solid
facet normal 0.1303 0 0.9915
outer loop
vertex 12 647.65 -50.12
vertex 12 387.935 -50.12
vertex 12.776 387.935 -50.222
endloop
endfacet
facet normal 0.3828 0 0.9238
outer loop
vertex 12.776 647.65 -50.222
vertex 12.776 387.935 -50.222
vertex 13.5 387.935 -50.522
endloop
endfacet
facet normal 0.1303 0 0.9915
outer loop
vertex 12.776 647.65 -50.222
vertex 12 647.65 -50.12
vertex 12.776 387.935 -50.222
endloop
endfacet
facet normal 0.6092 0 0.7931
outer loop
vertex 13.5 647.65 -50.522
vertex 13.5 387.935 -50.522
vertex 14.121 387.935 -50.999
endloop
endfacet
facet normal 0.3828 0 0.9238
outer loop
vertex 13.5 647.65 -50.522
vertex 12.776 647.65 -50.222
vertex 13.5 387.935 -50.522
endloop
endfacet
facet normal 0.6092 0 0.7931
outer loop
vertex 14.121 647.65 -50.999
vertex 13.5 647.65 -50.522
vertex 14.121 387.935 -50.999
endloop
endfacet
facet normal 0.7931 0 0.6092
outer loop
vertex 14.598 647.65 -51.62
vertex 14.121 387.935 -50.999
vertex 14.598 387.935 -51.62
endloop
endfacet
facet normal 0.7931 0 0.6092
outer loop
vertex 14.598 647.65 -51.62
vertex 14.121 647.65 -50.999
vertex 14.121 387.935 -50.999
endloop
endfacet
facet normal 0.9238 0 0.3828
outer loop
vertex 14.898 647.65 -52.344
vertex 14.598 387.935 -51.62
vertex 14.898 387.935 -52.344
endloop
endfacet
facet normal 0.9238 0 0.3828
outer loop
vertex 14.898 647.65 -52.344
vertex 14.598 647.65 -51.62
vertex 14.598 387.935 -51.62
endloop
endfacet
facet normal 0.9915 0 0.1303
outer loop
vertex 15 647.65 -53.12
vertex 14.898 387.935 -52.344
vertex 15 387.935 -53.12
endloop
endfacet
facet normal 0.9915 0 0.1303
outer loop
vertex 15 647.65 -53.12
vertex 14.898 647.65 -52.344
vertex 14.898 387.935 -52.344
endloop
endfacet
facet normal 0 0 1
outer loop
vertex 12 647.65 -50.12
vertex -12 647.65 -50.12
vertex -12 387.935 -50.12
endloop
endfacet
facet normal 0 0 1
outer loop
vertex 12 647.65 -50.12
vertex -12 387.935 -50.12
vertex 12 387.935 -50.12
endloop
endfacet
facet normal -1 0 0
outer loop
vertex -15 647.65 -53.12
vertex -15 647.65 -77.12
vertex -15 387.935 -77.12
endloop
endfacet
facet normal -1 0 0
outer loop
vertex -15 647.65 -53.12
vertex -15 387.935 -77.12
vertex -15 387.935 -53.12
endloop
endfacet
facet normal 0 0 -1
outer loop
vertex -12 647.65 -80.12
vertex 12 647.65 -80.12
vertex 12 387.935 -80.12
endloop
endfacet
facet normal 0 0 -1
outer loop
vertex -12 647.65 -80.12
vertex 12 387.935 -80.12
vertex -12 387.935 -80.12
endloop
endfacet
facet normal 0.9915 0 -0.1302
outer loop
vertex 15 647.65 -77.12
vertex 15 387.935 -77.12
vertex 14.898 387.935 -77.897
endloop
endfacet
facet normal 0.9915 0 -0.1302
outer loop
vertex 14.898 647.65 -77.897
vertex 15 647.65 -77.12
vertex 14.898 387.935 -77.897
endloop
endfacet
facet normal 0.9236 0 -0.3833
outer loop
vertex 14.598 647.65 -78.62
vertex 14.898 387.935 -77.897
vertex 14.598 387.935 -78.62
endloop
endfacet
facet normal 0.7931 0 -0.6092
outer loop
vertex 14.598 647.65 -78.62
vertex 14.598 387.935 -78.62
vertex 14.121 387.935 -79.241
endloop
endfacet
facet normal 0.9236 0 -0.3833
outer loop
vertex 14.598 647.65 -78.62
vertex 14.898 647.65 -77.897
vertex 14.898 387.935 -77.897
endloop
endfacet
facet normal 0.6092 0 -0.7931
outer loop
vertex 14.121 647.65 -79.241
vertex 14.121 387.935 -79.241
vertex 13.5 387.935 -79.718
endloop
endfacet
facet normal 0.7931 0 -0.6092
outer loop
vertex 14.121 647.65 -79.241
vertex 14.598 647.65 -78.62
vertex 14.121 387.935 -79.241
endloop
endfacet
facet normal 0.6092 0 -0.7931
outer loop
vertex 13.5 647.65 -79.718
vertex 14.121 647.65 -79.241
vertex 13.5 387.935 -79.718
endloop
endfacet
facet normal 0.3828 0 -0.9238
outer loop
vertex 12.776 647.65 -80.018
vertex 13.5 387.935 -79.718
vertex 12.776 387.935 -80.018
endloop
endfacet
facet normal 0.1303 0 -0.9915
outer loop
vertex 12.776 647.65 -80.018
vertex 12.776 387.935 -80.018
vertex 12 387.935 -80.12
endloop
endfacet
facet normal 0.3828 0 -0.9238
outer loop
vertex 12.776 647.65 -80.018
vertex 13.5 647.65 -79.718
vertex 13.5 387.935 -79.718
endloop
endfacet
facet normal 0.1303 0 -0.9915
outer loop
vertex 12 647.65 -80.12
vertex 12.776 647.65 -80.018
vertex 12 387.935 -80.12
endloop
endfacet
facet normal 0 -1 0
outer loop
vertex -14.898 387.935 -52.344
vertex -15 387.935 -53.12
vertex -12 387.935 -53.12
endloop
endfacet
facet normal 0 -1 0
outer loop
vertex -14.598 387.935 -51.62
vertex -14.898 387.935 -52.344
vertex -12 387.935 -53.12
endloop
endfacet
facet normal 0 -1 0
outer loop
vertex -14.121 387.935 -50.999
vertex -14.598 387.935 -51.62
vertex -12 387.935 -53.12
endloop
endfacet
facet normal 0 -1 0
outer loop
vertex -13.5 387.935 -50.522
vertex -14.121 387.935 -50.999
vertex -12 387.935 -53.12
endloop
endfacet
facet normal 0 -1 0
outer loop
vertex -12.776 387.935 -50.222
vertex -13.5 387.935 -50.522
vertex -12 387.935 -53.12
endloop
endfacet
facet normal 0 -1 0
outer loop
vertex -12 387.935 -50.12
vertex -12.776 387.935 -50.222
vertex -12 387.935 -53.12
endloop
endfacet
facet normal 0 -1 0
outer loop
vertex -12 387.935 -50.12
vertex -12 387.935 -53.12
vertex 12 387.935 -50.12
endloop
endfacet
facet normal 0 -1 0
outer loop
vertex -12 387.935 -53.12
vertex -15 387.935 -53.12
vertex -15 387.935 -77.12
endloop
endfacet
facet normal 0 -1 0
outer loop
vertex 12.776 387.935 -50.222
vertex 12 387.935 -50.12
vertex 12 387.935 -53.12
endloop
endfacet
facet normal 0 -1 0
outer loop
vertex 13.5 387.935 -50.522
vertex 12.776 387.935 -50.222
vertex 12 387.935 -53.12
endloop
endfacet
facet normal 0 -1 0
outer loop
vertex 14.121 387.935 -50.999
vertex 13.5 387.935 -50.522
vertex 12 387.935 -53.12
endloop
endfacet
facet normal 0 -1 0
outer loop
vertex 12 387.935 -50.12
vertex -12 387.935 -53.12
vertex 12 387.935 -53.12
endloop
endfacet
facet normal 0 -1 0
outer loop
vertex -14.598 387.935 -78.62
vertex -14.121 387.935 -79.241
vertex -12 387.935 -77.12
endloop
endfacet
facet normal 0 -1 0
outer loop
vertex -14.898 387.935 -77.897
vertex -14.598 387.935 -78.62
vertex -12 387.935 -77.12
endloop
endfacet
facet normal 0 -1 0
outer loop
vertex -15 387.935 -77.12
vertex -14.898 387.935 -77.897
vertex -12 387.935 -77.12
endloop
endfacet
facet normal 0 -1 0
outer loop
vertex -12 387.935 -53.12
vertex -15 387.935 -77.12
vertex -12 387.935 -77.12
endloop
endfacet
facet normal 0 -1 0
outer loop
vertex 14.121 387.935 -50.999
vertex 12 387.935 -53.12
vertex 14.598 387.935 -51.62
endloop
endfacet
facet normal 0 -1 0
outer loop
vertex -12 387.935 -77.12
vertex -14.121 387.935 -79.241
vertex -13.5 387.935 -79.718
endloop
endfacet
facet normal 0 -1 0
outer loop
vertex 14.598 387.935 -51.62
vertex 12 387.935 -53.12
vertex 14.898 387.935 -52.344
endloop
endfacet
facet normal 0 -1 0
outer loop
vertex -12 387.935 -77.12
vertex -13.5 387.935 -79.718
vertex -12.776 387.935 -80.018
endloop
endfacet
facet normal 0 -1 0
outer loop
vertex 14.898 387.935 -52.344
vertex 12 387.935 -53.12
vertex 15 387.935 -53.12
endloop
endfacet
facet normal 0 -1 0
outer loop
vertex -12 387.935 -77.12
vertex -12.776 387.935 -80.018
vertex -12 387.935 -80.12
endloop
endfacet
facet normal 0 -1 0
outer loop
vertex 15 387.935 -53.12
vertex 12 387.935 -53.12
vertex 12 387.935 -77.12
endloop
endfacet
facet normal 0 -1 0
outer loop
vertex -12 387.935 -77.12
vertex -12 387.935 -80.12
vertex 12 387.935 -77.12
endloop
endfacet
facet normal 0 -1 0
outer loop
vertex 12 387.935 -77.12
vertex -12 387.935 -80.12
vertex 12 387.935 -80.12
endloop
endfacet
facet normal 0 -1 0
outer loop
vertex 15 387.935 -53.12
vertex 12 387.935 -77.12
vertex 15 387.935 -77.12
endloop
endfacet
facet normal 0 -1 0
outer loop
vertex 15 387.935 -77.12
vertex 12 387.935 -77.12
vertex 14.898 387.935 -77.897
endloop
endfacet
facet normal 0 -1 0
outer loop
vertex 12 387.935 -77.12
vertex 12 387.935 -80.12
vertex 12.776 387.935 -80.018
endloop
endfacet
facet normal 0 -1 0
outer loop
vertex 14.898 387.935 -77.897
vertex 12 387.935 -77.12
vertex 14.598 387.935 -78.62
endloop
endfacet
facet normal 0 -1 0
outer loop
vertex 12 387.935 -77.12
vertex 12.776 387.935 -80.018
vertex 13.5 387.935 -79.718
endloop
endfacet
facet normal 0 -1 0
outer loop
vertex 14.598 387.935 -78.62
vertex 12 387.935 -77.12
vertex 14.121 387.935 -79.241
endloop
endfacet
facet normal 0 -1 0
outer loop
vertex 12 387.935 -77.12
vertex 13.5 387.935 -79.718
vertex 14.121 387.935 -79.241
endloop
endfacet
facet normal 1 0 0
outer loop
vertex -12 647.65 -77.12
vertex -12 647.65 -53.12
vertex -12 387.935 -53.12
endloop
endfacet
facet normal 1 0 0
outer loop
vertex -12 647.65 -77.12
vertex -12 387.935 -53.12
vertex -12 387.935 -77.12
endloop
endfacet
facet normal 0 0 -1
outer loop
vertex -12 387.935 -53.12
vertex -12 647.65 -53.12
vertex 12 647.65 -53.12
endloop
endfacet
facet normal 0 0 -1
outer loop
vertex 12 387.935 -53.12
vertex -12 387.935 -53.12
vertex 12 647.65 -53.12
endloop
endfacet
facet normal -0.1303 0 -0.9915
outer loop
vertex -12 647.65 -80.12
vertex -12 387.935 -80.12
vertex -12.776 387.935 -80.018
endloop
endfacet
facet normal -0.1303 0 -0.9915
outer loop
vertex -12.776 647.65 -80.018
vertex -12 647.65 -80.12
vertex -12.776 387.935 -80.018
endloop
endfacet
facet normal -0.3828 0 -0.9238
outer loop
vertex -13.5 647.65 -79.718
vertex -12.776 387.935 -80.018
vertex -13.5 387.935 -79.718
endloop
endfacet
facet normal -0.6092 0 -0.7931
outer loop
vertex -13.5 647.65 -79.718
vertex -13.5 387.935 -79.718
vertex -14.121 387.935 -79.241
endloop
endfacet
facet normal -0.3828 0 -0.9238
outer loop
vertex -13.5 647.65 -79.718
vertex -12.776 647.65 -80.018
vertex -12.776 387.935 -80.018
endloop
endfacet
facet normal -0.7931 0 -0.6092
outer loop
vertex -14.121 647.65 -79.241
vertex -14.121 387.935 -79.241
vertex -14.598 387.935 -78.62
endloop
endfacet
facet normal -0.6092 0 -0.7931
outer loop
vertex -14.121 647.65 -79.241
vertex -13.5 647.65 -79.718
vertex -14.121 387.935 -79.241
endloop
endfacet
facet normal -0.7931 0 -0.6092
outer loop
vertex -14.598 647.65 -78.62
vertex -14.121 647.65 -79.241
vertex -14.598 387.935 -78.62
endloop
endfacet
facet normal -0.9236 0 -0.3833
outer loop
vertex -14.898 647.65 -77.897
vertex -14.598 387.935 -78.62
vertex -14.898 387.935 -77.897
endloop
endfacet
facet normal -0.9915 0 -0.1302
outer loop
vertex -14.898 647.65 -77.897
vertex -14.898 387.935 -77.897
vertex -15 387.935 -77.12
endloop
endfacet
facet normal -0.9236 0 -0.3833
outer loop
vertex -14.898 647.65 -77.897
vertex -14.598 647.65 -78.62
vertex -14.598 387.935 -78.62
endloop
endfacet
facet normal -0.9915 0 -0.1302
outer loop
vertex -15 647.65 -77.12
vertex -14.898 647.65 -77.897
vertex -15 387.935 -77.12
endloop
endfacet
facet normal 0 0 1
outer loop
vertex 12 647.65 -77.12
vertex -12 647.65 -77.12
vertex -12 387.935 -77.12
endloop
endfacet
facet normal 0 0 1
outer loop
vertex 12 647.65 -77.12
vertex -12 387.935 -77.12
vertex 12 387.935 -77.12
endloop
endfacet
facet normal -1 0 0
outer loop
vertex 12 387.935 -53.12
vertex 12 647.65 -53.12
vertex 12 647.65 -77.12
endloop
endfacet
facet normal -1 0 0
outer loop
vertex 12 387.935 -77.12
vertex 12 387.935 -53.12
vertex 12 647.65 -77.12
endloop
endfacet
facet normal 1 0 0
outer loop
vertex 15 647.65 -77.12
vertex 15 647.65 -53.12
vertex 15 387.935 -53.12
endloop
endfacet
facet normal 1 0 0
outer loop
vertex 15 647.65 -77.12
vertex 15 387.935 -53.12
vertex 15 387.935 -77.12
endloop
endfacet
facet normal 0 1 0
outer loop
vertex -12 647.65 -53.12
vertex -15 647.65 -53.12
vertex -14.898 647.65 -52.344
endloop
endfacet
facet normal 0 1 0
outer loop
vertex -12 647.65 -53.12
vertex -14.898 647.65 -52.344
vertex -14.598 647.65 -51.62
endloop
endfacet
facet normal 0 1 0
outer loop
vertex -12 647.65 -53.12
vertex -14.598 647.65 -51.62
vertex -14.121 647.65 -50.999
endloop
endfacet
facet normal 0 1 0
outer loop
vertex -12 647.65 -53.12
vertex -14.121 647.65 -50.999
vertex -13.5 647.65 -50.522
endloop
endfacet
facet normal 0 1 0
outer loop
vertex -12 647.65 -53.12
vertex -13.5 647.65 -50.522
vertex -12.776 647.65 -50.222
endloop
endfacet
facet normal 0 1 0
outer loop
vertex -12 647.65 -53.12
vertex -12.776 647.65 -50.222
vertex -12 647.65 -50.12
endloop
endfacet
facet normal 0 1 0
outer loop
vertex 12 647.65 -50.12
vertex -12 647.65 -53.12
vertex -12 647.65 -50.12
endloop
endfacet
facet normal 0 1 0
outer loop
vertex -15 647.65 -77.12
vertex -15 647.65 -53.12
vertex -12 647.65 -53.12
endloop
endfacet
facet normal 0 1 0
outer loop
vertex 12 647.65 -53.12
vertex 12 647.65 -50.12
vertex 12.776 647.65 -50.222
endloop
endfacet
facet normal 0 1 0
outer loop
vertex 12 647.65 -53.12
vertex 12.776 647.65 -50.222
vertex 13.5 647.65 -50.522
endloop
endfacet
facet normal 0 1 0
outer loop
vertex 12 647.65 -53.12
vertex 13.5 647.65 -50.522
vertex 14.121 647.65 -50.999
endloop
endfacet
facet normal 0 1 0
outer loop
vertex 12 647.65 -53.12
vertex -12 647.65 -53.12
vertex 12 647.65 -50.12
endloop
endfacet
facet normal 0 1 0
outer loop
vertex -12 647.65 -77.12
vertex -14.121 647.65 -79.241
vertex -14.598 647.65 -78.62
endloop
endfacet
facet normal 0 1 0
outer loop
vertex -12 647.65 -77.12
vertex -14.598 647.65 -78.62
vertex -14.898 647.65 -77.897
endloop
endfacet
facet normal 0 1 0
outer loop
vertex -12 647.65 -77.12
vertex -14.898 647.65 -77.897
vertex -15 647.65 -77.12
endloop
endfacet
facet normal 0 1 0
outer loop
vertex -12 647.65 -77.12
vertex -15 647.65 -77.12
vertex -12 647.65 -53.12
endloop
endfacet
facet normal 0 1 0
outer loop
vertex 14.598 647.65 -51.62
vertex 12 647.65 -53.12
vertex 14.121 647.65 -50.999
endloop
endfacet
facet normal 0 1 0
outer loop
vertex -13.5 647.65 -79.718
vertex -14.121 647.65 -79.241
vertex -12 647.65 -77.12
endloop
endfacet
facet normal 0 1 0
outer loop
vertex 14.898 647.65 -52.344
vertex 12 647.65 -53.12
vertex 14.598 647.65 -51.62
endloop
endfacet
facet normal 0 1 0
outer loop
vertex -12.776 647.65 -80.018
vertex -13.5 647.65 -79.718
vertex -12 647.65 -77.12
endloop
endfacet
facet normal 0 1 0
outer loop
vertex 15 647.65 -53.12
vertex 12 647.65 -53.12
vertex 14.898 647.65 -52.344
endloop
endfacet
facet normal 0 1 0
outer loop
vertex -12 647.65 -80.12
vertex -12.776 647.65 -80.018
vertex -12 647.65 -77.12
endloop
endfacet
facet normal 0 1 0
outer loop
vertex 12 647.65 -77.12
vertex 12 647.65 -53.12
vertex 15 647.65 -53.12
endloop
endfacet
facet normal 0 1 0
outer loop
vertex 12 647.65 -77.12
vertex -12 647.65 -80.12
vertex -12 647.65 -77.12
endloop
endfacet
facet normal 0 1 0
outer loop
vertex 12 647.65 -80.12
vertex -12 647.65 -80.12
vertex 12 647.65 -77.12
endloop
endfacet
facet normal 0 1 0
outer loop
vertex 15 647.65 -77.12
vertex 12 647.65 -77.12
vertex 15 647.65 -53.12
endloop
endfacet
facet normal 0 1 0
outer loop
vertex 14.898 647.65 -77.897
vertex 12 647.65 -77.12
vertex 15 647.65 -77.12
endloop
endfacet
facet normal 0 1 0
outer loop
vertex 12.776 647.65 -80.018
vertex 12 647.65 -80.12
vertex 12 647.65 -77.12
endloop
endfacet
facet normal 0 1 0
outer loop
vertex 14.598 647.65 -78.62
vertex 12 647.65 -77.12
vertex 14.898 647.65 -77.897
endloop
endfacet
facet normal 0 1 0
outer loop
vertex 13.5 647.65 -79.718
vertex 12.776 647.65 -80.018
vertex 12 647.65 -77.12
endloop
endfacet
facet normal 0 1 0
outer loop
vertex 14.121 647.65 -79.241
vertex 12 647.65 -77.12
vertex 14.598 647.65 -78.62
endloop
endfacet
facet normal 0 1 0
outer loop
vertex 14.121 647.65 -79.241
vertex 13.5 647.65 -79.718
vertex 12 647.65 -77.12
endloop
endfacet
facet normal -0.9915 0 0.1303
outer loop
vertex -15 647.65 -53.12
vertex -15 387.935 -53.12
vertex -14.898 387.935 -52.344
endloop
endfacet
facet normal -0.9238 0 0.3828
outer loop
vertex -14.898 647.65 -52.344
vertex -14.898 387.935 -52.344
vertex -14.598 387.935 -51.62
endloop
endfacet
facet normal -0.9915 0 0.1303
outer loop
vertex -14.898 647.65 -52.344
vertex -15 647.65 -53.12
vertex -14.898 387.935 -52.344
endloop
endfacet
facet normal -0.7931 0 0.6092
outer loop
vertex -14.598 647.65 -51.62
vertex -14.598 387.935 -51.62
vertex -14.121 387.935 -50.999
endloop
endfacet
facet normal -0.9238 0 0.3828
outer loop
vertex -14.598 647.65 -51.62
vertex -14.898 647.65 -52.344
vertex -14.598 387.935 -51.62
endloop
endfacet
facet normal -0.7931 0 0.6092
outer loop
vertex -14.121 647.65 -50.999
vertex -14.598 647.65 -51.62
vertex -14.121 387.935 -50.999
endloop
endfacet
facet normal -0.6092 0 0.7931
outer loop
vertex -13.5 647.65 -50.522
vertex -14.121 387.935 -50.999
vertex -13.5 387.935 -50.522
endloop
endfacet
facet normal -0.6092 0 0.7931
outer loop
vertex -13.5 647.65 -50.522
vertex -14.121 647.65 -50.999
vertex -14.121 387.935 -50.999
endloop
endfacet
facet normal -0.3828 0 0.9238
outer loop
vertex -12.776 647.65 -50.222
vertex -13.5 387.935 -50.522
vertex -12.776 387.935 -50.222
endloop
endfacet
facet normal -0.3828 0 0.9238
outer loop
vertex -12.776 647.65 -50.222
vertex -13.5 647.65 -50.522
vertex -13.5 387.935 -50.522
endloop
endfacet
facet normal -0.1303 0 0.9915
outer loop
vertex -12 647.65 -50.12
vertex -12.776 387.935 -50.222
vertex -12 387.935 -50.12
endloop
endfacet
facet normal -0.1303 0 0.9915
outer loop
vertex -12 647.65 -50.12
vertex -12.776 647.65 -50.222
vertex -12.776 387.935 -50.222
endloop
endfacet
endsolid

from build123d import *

# Parameters (mm, degrees)
CROQUIS1_W              = 24
CROQUIS1_H              = 24
SALIENTE_EXTRUIR1_DEPTH = 259.715457153


with BuildPart() as part:
    # Croquis1 → Saliente-Extruir1 (new body)
    with BuildSketch(Plane(origin=(0, 647.649993896, 0), x_dir=(1, 0, 0), z_dir=(0, 1, 0))):
        with BuildLine():
            Line((-12, 50.120137415), (12, 50.120137415))
            ThreePointArc((12, 50.120137415), (14.121320344, 50.998817072), (15, 53.120137415))
            Line((15, 53.120137415), (15, 77.120137415))
            ThreePointArc((15, 77.120137415), (14.121320344, 79.241457759), (12, 80.120137415))
            Line((12, 80.120137415), (-12, 80.120137415))
            ThreePointArc((-12, 80.120137415), (-14.121320344, 79.241457759), (-15, 77.120137415))
            Line((-15, 77.120137415), (-15, 53.120137415))
            ThreePointArc((-15, 53.120137415), (-14.121320344, 50.998817072), (-12, 50.120137415))
        make_face()
        with Locations((0, 65.120137415)):
            Rectangle(CROQUIS1_W, CROQUIS1_H, mode=Mode.SUBTRACT)
    extrude(amount=-SALIENTE_EXTRUIR1_DEPTH)


solid = part.part
